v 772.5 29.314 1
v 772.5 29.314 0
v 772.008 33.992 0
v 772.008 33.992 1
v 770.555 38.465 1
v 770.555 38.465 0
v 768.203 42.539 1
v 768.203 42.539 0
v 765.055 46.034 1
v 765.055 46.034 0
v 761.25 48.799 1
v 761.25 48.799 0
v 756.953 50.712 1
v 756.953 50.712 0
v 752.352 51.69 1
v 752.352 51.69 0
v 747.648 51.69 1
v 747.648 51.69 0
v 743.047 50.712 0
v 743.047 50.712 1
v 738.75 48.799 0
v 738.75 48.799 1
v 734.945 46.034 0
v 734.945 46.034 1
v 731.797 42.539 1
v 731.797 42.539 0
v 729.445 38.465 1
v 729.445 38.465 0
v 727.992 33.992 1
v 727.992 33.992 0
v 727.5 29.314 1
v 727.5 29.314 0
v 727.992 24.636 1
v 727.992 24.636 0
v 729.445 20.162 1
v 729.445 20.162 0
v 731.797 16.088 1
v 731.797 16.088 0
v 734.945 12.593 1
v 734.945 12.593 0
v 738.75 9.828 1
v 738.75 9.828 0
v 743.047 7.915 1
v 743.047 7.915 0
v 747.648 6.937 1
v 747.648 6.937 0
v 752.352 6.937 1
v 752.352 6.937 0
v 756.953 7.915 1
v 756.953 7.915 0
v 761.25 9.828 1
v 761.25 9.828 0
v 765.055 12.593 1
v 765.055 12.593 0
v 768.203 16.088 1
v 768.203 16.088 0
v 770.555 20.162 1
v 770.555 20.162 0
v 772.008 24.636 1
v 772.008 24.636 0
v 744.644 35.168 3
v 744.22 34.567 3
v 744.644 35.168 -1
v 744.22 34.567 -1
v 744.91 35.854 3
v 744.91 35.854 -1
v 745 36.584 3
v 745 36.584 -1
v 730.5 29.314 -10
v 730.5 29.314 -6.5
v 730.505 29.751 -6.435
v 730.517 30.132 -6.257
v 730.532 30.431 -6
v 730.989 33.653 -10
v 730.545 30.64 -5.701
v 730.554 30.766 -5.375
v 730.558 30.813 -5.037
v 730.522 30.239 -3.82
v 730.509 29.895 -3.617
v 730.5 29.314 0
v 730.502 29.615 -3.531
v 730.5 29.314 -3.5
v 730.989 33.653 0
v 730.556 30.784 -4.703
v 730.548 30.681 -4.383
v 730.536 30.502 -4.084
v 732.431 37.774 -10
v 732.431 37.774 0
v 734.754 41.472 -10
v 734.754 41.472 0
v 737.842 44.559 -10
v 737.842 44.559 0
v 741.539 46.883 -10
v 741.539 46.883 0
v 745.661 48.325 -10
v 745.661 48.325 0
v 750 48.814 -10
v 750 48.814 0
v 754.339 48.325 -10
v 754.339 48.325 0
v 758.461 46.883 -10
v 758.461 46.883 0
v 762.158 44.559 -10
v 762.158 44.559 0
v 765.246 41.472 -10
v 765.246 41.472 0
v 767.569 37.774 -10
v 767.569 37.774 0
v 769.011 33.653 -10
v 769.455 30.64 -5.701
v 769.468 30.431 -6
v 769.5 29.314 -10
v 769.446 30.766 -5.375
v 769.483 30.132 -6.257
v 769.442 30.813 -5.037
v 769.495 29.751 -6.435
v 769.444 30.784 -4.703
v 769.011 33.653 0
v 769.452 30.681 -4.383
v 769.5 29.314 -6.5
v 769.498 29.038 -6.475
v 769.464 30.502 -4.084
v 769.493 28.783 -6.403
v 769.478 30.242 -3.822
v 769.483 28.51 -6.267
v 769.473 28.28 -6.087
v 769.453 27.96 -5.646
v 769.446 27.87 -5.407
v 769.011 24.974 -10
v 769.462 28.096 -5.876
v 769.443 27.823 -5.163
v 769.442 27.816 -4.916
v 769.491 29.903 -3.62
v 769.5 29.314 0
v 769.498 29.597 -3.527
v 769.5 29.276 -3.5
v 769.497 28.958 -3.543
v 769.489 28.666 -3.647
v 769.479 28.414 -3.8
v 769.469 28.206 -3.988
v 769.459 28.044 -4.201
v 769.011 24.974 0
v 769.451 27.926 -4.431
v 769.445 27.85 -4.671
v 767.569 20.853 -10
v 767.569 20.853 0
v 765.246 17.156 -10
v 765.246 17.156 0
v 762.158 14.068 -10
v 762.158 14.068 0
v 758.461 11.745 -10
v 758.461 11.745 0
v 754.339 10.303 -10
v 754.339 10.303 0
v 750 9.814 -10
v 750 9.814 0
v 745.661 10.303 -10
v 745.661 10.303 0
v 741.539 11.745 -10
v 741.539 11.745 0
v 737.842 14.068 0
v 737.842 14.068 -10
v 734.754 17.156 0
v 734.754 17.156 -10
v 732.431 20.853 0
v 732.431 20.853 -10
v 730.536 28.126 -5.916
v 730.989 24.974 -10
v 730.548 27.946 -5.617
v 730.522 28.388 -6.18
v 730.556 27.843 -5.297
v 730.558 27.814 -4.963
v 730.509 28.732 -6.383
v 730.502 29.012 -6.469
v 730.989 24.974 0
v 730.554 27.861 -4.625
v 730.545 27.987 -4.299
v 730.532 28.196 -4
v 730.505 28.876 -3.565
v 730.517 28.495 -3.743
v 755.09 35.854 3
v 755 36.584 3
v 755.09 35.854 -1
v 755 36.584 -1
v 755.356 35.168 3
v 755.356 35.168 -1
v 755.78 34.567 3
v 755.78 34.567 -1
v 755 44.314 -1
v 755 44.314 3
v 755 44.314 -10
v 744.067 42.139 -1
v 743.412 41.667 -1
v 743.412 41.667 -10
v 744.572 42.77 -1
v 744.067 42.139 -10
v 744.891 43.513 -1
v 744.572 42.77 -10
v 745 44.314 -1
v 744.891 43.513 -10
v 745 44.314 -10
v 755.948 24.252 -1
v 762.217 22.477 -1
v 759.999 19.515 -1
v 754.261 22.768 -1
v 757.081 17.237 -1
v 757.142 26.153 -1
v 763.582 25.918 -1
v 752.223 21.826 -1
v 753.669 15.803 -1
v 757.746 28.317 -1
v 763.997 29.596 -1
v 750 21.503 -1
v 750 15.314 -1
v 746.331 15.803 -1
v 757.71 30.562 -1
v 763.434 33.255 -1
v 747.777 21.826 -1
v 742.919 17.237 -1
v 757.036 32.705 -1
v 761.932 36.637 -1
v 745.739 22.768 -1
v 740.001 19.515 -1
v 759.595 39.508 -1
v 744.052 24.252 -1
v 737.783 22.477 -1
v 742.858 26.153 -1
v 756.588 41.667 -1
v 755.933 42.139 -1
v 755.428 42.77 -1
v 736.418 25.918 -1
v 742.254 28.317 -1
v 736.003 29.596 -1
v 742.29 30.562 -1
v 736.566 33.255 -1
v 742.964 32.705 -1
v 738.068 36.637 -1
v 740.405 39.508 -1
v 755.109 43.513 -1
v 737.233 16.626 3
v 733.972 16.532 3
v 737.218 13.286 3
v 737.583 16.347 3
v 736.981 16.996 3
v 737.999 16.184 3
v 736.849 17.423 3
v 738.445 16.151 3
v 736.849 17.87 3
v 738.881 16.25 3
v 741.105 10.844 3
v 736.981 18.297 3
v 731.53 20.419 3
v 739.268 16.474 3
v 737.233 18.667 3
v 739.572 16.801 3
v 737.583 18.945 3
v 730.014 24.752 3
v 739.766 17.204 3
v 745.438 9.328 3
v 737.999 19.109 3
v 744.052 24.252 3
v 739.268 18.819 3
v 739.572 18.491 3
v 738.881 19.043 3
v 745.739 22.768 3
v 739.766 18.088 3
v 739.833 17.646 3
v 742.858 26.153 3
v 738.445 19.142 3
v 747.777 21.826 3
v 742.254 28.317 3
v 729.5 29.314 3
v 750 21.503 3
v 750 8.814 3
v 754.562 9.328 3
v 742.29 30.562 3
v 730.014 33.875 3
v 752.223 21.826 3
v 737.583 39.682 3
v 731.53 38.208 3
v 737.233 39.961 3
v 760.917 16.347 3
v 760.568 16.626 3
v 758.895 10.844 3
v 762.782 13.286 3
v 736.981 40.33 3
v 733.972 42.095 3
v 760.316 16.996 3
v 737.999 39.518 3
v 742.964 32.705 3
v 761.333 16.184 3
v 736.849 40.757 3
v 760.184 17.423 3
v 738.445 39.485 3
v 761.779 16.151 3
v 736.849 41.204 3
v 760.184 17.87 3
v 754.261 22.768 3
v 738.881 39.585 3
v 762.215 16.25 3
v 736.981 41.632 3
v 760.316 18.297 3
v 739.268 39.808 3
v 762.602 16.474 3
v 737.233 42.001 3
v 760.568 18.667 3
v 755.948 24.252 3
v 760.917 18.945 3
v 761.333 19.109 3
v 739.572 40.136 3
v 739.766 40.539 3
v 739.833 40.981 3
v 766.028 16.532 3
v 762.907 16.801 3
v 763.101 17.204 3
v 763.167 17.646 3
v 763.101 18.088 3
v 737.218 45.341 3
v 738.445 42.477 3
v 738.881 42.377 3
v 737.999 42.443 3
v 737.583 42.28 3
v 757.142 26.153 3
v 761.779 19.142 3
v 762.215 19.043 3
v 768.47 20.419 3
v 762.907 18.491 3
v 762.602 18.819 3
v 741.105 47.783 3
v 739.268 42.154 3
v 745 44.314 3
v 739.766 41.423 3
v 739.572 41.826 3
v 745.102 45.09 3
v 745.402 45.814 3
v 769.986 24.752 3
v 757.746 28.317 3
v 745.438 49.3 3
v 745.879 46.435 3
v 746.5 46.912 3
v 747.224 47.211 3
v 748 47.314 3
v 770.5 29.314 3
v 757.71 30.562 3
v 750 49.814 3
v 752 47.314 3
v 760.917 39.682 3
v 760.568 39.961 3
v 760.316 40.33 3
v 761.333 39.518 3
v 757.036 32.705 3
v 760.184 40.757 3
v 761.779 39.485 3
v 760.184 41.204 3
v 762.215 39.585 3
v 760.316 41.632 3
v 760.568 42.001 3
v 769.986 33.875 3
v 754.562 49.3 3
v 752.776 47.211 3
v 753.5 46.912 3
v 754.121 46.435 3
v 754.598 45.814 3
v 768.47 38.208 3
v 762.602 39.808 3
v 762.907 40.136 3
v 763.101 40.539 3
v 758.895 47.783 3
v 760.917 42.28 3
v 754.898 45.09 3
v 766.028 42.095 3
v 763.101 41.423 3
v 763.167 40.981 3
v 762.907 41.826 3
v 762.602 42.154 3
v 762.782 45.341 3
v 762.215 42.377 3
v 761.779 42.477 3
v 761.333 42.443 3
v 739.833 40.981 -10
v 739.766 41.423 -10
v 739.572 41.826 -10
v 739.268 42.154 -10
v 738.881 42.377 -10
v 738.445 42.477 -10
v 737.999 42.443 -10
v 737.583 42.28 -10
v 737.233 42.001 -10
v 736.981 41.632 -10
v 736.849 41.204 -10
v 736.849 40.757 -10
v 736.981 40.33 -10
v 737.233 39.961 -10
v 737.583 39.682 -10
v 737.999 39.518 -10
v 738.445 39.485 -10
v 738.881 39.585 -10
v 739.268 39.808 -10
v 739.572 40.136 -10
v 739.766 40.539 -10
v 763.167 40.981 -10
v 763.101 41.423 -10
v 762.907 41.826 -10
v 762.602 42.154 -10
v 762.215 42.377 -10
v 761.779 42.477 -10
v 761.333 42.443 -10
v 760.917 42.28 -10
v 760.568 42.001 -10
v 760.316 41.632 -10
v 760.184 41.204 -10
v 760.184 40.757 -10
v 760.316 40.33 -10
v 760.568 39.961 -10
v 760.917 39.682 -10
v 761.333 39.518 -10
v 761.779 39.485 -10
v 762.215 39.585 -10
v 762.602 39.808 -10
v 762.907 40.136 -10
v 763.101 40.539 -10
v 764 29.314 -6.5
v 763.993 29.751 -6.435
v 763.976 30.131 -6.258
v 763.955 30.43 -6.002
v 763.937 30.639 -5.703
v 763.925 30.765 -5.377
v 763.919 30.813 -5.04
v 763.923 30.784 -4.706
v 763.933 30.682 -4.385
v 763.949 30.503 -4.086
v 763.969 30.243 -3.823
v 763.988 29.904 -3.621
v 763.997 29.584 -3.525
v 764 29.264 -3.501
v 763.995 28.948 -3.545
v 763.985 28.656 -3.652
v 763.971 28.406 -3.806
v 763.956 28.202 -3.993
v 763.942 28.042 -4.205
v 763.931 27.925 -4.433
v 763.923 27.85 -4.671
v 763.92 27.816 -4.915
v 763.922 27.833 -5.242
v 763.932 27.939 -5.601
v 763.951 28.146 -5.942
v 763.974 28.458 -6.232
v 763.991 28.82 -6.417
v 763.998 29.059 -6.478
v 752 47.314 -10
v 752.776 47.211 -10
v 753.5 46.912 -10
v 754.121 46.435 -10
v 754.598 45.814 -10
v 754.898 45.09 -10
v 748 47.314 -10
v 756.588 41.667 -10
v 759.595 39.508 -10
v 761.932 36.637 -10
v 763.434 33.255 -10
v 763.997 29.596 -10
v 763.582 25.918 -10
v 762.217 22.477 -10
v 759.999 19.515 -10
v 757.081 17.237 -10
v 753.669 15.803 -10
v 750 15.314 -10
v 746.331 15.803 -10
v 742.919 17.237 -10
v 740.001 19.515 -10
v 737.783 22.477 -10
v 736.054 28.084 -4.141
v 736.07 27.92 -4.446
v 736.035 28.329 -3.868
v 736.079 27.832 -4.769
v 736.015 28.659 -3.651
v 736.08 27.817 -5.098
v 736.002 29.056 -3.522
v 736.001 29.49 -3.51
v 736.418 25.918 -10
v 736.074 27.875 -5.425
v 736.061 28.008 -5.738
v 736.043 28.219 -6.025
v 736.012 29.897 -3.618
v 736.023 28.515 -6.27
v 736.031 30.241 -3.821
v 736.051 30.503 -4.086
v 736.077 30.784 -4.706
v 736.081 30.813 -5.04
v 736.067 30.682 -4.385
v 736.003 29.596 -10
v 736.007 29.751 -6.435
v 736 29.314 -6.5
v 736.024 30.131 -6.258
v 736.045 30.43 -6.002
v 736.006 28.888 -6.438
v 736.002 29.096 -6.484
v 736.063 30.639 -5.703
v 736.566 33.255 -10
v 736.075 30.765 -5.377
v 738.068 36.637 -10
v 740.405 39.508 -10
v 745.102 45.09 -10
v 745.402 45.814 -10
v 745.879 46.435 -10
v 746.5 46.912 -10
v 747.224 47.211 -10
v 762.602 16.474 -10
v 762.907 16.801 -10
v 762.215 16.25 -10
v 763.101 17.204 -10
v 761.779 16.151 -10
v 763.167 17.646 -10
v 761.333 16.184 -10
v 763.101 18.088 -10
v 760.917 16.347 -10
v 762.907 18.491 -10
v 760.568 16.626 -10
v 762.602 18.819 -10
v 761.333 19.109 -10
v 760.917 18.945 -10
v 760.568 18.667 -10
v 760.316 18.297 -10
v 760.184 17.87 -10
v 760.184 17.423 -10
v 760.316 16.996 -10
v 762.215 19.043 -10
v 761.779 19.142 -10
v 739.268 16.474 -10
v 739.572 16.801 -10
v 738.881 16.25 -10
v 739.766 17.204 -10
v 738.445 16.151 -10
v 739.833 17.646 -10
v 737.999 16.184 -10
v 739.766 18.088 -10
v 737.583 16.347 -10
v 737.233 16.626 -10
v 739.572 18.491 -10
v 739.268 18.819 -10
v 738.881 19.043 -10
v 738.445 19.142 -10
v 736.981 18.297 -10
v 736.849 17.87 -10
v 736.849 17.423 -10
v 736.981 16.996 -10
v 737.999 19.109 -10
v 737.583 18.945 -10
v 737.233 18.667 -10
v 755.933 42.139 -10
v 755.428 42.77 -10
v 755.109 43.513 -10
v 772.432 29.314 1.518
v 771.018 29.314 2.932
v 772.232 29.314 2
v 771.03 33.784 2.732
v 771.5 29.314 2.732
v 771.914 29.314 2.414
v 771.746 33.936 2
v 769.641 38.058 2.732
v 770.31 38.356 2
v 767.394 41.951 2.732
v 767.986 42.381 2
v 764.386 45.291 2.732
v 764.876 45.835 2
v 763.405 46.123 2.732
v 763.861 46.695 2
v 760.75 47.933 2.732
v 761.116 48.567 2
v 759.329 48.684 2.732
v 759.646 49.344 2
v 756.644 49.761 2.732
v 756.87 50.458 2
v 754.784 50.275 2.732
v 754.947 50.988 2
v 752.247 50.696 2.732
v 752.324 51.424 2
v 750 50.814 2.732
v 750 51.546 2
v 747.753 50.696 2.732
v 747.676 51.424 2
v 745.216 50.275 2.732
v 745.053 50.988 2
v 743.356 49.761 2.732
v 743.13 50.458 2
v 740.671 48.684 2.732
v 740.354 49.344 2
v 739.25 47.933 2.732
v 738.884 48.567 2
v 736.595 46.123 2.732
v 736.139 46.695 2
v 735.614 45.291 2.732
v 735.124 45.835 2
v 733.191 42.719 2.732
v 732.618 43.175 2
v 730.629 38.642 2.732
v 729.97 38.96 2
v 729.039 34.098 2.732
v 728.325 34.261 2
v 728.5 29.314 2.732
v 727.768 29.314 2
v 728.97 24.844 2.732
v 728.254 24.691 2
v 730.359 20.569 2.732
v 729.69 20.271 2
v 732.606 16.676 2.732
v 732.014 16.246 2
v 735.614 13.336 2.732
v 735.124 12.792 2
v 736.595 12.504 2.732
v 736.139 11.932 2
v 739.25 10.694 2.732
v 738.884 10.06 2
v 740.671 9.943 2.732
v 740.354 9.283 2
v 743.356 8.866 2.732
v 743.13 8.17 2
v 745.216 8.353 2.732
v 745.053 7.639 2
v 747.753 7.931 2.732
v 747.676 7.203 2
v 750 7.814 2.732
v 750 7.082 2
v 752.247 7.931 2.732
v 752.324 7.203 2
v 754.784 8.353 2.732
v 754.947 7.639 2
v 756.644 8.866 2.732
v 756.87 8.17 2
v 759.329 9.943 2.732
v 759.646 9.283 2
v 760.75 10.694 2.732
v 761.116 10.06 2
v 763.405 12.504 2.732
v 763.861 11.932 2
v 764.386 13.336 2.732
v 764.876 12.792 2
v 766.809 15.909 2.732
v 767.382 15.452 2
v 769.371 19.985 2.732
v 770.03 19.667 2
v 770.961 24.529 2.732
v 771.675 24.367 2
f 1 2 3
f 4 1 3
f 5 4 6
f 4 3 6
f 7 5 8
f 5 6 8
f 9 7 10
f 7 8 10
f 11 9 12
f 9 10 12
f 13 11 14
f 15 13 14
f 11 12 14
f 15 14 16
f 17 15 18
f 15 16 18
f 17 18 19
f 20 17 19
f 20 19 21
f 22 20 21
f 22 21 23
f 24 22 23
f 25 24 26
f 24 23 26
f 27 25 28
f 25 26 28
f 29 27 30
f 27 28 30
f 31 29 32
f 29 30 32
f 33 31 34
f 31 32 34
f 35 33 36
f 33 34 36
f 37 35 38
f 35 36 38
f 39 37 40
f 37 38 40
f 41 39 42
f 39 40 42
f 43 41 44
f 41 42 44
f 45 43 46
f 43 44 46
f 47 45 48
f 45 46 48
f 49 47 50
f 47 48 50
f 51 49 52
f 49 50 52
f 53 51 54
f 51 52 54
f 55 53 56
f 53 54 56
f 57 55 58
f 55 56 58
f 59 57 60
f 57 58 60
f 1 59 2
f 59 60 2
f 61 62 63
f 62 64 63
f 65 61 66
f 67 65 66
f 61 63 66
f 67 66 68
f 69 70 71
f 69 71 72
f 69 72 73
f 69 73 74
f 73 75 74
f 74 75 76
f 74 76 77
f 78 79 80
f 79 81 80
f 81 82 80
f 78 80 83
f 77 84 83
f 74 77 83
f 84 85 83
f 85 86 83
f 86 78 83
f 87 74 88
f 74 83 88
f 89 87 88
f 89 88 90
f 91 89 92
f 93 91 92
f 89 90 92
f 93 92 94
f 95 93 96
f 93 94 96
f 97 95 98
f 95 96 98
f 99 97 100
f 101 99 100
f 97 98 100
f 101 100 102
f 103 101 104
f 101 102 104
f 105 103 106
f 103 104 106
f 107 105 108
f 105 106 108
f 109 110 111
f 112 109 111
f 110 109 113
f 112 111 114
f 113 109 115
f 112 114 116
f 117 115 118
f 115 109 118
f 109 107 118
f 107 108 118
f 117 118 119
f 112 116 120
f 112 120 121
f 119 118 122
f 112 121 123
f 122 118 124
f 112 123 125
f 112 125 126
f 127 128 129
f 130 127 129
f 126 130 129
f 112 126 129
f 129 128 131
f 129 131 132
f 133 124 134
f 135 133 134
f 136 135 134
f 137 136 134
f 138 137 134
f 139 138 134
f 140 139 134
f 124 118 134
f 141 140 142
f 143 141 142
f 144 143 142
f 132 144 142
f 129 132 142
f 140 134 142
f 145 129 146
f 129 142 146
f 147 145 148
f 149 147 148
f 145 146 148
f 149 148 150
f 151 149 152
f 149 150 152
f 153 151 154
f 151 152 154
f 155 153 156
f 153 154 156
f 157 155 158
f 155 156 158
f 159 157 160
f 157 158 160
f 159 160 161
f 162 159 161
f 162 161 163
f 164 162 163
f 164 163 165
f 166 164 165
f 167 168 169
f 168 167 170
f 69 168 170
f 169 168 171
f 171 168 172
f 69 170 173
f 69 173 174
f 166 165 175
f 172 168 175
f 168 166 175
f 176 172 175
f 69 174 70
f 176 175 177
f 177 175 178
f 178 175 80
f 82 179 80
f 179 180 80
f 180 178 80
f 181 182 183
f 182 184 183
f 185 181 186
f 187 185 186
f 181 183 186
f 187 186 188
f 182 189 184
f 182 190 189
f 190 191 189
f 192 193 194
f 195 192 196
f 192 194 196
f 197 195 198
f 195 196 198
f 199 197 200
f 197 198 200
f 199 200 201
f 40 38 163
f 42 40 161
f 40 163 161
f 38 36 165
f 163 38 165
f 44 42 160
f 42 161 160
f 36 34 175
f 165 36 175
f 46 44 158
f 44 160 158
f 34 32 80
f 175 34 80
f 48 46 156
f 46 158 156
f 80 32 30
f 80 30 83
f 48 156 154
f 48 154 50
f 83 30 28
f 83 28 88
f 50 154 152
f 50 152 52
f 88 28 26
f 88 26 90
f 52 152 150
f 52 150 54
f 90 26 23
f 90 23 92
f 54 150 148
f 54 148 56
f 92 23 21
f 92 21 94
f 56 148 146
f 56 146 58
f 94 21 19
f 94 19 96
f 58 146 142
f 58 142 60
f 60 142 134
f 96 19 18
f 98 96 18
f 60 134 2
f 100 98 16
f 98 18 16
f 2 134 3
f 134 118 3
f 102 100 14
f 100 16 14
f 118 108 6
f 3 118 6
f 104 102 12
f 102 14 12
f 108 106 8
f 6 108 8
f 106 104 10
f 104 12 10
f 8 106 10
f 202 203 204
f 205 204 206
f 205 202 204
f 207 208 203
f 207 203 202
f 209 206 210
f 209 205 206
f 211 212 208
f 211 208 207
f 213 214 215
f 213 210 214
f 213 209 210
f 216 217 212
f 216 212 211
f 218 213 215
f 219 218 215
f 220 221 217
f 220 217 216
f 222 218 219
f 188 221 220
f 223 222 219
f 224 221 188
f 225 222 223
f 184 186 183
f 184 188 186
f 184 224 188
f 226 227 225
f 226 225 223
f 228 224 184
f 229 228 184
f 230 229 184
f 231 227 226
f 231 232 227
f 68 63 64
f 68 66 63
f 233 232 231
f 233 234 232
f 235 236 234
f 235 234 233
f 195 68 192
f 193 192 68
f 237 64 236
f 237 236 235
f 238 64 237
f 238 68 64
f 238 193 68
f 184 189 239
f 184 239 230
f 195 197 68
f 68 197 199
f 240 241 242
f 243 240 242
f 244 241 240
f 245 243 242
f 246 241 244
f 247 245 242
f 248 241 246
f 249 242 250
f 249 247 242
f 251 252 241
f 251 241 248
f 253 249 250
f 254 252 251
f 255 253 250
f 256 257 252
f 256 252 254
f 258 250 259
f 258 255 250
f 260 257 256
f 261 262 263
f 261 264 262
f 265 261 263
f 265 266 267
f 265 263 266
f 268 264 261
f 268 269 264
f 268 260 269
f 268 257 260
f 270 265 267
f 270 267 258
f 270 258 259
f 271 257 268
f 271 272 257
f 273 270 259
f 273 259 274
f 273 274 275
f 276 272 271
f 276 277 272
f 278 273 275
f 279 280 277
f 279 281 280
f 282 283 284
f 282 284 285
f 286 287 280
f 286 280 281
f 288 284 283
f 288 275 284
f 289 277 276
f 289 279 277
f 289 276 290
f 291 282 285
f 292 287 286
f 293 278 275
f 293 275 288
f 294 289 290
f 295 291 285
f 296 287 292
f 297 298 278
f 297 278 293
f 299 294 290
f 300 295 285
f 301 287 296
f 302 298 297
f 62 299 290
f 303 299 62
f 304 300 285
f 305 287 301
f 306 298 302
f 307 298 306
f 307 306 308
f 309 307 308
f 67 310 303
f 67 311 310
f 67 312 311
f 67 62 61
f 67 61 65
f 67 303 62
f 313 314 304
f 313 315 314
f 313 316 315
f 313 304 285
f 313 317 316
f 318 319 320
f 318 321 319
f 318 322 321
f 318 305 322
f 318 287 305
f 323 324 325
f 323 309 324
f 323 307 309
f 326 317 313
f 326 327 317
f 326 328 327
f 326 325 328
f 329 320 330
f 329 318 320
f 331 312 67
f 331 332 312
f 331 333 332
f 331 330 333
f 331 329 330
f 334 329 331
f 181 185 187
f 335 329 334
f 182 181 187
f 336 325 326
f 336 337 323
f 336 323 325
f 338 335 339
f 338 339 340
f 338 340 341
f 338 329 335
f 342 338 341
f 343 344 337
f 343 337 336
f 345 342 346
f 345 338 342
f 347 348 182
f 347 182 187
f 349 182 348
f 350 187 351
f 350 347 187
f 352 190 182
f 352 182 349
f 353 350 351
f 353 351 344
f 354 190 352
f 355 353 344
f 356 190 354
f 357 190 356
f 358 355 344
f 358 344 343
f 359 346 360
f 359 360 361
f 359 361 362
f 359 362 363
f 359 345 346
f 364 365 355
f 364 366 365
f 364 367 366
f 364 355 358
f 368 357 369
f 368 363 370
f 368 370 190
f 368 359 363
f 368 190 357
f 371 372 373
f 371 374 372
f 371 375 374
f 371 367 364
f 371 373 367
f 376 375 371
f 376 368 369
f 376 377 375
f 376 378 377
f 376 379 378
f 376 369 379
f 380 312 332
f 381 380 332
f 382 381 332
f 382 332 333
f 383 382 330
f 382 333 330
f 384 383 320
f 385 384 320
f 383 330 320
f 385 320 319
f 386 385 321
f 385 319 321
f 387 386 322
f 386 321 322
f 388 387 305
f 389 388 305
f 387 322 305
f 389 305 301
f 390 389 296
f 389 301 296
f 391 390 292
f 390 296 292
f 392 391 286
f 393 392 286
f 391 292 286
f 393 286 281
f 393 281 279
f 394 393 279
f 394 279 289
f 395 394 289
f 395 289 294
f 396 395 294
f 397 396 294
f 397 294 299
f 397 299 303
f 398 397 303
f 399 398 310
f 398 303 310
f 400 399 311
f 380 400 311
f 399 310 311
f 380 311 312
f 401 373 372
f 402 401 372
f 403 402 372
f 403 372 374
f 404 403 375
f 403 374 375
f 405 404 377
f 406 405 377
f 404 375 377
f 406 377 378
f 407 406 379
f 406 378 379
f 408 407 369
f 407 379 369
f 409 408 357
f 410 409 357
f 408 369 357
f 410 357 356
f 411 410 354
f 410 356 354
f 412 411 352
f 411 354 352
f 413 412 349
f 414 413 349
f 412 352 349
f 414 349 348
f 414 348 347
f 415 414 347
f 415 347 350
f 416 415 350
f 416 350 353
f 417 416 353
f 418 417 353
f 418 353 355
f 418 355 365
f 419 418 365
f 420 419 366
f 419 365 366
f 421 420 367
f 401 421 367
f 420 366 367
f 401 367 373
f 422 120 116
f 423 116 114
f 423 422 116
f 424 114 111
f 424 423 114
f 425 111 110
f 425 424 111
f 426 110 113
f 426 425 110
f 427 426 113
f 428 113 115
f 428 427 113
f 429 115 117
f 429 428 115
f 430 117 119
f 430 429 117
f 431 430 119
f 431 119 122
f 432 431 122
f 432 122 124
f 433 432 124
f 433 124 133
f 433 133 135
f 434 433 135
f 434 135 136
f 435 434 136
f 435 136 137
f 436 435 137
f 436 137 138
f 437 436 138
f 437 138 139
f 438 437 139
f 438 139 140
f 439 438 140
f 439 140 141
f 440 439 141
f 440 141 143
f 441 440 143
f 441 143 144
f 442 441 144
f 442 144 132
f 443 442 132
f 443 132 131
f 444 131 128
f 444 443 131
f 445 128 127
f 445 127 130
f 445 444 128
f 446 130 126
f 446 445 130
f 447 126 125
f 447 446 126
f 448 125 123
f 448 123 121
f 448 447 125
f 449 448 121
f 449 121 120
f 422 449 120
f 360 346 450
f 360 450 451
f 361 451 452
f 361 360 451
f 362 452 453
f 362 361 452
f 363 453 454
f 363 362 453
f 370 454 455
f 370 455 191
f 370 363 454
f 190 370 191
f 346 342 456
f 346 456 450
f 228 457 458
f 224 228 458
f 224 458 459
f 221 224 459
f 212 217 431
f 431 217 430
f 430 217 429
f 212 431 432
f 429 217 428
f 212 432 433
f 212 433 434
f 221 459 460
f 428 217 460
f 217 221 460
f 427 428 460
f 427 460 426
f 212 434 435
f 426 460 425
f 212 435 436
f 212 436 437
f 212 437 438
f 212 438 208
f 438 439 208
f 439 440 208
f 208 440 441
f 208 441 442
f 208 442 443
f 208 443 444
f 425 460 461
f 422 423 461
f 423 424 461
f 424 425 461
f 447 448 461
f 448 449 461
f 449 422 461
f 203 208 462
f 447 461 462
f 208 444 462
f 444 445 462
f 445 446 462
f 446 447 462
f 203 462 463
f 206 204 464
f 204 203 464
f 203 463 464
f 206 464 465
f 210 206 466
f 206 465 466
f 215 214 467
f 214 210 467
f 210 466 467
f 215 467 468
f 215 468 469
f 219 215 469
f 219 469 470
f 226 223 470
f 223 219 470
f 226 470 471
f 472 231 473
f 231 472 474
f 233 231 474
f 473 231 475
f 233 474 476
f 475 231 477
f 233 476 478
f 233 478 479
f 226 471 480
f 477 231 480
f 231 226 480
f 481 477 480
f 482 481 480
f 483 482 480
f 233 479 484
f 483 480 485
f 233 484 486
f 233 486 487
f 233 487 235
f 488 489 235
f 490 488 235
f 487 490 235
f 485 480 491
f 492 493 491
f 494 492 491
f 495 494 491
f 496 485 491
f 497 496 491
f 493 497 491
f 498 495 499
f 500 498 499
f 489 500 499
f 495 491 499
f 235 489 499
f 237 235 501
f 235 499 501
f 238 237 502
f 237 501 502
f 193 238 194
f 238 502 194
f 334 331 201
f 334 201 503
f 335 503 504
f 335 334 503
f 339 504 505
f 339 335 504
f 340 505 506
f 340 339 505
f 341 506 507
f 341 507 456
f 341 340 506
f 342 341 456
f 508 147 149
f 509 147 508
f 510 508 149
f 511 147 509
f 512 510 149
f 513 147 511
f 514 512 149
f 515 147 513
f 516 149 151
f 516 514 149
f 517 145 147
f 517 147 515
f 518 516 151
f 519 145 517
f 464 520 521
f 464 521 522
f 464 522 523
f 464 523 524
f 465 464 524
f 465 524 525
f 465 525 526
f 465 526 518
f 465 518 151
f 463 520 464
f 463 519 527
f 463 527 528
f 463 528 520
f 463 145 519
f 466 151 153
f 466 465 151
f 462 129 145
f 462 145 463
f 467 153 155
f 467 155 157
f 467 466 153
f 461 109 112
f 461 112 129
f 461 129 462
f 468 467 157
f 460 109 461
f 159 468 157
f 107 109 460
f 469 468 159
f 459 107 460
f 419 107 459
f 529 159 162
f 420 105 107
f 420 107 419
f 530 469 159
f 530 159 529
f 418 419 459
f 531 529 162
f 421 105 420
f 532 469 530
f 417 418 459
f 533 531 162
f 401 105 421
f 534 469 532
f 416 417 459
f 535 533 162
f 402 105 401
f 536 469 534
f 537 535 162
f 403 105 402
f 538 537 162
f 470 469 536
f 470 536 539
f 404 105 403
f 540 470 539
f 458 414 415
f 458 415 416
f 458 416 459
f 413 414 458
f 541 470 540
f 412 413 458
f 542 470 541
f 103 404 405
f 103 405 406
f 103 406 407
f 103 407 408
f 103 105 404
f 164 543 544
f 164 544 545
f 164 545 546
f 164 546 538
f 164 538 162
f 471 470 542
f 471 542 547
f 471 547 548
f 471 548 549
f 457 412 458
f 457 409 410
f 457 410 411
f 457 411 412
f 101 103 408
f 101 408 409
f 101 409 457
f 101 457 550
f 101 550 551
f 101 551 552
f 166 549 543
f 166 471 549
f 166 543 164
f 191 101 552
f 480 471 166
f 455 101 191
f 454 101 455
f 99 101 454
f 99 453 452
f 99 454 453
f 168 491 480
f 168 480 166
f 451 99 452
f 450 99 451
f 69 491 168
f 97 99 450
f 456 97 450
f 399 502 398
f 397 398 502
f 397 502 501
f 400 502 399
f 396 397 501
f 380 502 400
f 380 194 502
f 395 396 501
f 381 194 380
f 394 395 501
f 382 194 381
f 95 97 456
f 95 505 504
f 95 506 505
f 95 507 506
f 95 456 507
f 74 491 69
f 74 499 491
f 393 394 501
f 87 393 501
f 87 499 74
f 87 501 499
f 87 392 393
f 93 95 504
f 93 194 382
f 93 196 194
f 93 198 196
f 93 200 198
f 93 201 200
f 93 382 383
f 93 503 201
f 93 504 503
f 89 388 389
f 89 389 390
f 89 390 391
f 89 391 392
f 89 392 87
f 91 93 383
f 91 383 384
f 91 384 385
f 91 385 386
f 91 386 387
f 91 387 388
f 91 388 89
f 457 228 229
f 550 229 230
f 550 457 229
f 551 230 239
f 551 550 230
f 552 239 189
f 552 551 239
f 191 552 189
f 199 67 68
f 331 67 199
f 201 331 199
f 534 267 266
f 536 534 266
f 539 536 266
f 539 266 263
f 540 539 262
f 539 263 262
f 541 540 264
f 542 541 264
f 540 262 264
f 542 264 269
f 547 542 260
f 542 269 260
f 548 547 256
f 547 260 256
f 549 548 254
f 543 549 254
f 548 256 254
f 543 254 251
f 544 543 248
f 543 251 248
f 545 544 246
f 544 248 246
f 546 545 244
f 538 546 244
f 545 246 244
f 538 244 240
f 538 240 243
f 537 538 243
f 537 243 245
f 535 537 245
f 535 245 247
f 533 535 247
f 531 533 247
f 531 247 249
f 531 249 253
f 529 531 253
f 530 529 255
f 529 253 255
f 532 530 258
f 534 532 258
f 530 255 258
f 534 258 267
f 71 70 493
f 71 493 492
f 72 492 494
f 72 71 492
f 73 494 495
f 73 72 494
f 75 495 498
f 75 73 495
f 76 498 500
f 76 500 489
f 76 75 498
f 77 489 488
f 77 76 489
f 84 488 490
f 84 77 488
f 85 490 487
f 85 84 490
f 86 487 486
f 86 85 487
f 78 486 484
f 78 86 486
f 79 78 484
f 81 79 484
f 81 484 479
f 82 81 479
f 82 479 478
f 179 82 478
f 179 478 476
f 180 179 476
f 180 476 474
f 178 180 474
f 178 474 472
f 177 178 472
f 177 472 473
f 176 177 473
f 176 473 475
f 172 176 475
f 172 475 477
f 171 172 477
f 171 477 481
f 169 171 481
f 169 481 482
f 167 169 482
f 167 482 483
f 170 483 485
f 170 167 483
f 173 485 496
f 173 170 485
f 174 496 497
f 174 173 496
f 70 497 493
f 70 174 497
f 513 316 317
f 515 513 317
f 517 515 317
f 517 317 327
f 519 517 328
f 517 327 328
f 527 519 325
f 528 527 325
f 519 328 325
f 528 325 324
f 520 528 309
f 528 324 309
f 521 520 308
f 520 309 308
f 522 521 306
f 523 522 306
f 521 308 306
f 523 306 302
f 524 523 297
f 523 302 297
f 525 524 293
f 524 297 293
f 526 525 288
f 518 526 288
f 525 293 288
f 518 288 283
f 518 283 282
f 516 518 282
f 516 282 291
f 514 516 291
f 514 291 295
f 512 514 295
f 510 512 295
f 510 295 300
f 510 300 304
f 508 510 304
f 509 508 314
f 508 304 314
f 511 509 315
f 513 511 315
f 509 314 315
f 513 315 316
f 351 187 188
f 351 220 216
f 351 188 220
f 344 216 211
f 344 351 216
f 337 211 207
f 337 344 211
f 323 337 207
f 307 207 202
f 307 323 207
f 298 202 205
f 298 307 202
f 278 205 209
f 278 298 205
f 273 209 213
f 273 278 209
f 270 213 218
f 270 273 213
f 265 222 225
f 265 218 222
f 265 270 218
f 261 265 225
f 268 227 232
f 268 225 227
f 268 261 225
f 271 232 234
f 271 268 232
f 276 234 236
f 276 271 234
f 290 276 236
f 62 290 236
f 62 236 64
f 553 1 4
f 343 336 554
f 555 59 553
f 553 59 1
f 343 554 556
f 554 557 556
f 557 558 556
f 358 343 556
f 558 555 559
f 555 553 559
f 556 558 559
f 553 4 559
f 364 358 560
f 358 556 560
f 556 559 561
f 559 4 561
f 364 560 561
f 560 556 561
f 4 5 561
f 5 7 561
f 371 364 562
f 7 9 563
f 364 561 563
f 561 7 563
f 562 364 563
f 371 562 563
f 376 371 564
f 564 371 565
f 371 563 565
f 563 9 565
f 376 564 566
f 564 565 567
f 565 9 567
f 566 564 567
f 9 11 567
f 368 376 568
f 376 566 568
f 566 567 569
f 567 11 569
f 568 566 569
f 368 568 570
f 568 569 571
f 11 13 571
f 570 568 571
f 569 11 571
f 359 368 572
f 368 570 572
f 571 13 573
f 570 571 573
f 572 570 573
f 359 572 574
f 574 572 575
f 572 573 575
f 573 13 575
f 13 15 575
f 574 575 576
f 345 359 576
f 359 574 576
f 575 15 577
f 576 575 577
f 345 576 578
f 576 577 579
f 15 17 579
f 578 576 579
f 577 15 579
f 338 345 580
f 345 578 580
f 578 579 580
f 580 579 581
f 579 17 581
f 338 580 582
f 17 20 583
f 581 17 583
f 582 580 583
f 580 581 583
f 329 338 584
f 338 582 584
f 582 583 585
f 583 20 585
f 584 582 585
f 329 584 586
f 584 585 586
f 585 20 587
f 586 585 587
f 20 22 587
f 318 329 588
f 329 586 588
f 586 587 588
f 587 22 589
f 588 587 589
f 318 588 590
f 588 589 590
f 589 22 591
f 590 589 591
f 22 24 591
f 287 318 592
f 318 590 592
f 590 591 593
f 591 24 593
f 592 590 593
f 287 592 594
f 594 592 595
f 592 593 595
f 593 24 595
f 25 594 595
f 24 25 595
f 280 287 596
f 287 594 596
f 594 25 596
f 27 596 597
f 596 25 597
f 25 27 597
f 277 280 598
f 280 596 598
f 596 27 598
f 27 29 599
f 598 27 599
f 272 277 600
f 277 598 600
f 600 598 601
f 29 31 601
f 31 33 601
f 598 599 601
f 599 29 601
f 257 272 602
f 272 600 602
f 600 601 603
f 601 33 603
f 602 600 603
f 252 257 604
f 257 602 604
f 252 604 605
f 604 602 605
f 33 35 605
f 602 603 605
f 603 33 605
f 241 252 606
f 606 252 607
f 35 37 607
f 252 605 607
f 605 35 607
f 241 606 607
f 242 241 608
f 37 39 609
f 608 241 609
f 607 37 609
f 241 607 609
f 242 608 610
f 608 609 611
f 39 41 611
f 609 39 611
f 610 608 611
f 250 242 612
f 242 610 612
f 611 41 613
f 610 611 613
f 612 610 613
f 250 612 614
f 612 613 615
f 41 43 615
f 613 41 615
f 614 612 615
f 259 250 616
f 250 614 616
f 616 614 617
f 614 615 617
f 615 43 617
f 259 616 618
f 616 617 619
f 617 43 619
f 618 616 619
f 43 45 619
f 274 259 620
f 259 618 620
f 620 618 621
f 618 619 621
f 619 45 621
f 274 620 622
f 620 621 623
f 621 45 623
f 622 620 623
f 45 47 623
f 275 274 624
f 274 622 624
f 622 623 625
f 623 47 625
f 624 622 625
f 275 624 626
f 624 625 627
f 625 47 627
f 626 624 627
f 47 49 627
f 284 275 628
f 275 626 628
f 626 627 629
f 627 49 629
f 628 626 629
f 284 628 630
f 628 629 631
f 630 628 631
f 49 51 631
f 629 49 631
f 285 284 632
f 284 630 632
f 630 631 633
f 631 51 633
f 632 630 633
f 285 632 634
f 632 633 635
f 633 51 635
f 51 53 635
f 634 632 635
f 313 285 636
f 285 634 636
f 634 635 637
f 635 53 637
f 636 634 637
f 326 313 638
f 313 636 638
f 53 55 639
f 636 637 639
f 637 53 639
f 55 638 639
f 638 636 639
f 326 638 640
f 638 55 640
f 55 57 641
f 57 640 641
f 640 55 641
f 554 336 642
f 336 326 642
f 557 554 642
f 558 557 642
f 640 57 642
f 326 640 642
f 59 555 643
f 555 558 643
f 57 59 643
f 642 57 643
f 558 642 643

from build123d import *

# Parameters (mm, degrees)
SKETCH1_R               = 22.5
BOSS_EXTRUDE1_DEPTH     = 3
SKETCH2_R               = 19.5
BOSS_EXTRUDE2_DEPTH     = 10
SKETCH3_R               = 1.5
CUT_EXTRUDE1_DEPTH      = 13
CUT_EXTRUDE2_DEPTH      = 60.505474974
CUT_EXTRUDE2_DEPTH_BACK = 60.505474974
SKETCH4_R               = 1.5
SKETCH5_R               = 14
CUT_EXTRUDE3_DEPTH      = 9
FILLET1_R               = 3
FILLET2_R               = 2


with BuildPart() as part:
    # Sketch1 → Boss-Extrude1 (new body)
    with BuildSketch(Plane.XY):
        with Locations((750, 29.313623227)):
            Circle(SKETCH1_R)
    extrude(amount=BOSS_EXTRUDE1_DEPTH)

    # Sketch2 → Boss-Extrude2 (add)
    with BuildSketch(Plane(origin=(0, 0, 0), x_dir=(-1, 0, 0), z_dir=(0, 0, -1))):
        with Locations((-750, 29.313623227)):
            Circle(SKETCH2_R)
    extrude(amount=BOSS_EXTRUDE2_DEPTH)

    # Sketch3 → Cut-Extrude1 (cut)
    with BuildSketch(Plane.XY.offset(3)):
        with Locations((761.66726189, 17.646361337)):
            Circle(SKETCH3_R)
        with Locations((738.33273811, 17.646361337)):
            Circle(SKETCH3_R)
        with Locations((738.33273811, 40.980885116)):
            Circle(SKETCH3_R)
        with Locations((761.66726189, 40.980885116)):
            Circle(SKETCH3_R)
        with BuildLine():
            Line((748, 47.313623227), (752, 47.313623227))
            ThreePointArc((752, 47.313623227), (754.121320344, 46.43494357), (755, 44.313623227))
            Line((755, 44.313623227), (755, 35.313623227))
            ThreePointArc((755, 35.313623227), (750, 21.503373551), (745, 35.313623227))
            Line((745, 35.313623227), (745, 44.313623227))
            ThreePointArc((745, 44.313623227), (745.878679656, 46.43494357), (748, 47.313623227))
        make_face()
    extrude(amount=-CUT_EXTRUDE1_DEPTH, mode=Mode.SUBTRACT)

    # Sketch4 → Cut-Extrude2 (cut, two sides: drawn at the far end of the back side and taken through both)
    with BuildSketch(Plane(origin=(745, 0, 0), x_dir=(0, 0, -1), z_dir=(1, 0, 0)).offset(-CUT_EXTRUDE2_DEPTH_BACK)):
        with Locations((5, 29.313623227)):
            Circle(SKETCH4_R)
    extrude(amount=CUT_EXTRUDE2_DEPTH + CUT_EXTRUDE2_DEPTH_BACK, mode=Mode.SUBTRACT)

    # Sketch5 → Cut-Extrude3 (cut)
    with BuildSketch(Plane(origin=(0, 0, -10), x_dir=(-1, 0, 0), z_dir=(0, 0, -1))):
        with Locations((-750, 29.313623227)):
            Circle(SKETCH5_R)
    extrude(amount=-CUT_EXTRUDE3_DEPTH, mode=Mode.SUBTRACT)

    # Fillet1
    fillet1_edges = [part.edges().sort_by_distance(p)[0] for p in [
        (755, 35.313623227, 1),
        (745, 35.313623227, 1),
        (755, 42.390320057, -5.5),
        (745, 42.390320057, -5.5),
    ]]
    fillet(fillet1_edges, radius=FILLET1_R - 0.0001)  # a hair under: the kernel refuses the full size

    # Fillet2
    fillet2_edges = [part.edges().sort_by_distance(p)[0] for p in [
        (727.5, 29.313623227, 3),
    ]]
    fillet(fillet2_edges, radius=FILLET2_R)


solid = part.part
